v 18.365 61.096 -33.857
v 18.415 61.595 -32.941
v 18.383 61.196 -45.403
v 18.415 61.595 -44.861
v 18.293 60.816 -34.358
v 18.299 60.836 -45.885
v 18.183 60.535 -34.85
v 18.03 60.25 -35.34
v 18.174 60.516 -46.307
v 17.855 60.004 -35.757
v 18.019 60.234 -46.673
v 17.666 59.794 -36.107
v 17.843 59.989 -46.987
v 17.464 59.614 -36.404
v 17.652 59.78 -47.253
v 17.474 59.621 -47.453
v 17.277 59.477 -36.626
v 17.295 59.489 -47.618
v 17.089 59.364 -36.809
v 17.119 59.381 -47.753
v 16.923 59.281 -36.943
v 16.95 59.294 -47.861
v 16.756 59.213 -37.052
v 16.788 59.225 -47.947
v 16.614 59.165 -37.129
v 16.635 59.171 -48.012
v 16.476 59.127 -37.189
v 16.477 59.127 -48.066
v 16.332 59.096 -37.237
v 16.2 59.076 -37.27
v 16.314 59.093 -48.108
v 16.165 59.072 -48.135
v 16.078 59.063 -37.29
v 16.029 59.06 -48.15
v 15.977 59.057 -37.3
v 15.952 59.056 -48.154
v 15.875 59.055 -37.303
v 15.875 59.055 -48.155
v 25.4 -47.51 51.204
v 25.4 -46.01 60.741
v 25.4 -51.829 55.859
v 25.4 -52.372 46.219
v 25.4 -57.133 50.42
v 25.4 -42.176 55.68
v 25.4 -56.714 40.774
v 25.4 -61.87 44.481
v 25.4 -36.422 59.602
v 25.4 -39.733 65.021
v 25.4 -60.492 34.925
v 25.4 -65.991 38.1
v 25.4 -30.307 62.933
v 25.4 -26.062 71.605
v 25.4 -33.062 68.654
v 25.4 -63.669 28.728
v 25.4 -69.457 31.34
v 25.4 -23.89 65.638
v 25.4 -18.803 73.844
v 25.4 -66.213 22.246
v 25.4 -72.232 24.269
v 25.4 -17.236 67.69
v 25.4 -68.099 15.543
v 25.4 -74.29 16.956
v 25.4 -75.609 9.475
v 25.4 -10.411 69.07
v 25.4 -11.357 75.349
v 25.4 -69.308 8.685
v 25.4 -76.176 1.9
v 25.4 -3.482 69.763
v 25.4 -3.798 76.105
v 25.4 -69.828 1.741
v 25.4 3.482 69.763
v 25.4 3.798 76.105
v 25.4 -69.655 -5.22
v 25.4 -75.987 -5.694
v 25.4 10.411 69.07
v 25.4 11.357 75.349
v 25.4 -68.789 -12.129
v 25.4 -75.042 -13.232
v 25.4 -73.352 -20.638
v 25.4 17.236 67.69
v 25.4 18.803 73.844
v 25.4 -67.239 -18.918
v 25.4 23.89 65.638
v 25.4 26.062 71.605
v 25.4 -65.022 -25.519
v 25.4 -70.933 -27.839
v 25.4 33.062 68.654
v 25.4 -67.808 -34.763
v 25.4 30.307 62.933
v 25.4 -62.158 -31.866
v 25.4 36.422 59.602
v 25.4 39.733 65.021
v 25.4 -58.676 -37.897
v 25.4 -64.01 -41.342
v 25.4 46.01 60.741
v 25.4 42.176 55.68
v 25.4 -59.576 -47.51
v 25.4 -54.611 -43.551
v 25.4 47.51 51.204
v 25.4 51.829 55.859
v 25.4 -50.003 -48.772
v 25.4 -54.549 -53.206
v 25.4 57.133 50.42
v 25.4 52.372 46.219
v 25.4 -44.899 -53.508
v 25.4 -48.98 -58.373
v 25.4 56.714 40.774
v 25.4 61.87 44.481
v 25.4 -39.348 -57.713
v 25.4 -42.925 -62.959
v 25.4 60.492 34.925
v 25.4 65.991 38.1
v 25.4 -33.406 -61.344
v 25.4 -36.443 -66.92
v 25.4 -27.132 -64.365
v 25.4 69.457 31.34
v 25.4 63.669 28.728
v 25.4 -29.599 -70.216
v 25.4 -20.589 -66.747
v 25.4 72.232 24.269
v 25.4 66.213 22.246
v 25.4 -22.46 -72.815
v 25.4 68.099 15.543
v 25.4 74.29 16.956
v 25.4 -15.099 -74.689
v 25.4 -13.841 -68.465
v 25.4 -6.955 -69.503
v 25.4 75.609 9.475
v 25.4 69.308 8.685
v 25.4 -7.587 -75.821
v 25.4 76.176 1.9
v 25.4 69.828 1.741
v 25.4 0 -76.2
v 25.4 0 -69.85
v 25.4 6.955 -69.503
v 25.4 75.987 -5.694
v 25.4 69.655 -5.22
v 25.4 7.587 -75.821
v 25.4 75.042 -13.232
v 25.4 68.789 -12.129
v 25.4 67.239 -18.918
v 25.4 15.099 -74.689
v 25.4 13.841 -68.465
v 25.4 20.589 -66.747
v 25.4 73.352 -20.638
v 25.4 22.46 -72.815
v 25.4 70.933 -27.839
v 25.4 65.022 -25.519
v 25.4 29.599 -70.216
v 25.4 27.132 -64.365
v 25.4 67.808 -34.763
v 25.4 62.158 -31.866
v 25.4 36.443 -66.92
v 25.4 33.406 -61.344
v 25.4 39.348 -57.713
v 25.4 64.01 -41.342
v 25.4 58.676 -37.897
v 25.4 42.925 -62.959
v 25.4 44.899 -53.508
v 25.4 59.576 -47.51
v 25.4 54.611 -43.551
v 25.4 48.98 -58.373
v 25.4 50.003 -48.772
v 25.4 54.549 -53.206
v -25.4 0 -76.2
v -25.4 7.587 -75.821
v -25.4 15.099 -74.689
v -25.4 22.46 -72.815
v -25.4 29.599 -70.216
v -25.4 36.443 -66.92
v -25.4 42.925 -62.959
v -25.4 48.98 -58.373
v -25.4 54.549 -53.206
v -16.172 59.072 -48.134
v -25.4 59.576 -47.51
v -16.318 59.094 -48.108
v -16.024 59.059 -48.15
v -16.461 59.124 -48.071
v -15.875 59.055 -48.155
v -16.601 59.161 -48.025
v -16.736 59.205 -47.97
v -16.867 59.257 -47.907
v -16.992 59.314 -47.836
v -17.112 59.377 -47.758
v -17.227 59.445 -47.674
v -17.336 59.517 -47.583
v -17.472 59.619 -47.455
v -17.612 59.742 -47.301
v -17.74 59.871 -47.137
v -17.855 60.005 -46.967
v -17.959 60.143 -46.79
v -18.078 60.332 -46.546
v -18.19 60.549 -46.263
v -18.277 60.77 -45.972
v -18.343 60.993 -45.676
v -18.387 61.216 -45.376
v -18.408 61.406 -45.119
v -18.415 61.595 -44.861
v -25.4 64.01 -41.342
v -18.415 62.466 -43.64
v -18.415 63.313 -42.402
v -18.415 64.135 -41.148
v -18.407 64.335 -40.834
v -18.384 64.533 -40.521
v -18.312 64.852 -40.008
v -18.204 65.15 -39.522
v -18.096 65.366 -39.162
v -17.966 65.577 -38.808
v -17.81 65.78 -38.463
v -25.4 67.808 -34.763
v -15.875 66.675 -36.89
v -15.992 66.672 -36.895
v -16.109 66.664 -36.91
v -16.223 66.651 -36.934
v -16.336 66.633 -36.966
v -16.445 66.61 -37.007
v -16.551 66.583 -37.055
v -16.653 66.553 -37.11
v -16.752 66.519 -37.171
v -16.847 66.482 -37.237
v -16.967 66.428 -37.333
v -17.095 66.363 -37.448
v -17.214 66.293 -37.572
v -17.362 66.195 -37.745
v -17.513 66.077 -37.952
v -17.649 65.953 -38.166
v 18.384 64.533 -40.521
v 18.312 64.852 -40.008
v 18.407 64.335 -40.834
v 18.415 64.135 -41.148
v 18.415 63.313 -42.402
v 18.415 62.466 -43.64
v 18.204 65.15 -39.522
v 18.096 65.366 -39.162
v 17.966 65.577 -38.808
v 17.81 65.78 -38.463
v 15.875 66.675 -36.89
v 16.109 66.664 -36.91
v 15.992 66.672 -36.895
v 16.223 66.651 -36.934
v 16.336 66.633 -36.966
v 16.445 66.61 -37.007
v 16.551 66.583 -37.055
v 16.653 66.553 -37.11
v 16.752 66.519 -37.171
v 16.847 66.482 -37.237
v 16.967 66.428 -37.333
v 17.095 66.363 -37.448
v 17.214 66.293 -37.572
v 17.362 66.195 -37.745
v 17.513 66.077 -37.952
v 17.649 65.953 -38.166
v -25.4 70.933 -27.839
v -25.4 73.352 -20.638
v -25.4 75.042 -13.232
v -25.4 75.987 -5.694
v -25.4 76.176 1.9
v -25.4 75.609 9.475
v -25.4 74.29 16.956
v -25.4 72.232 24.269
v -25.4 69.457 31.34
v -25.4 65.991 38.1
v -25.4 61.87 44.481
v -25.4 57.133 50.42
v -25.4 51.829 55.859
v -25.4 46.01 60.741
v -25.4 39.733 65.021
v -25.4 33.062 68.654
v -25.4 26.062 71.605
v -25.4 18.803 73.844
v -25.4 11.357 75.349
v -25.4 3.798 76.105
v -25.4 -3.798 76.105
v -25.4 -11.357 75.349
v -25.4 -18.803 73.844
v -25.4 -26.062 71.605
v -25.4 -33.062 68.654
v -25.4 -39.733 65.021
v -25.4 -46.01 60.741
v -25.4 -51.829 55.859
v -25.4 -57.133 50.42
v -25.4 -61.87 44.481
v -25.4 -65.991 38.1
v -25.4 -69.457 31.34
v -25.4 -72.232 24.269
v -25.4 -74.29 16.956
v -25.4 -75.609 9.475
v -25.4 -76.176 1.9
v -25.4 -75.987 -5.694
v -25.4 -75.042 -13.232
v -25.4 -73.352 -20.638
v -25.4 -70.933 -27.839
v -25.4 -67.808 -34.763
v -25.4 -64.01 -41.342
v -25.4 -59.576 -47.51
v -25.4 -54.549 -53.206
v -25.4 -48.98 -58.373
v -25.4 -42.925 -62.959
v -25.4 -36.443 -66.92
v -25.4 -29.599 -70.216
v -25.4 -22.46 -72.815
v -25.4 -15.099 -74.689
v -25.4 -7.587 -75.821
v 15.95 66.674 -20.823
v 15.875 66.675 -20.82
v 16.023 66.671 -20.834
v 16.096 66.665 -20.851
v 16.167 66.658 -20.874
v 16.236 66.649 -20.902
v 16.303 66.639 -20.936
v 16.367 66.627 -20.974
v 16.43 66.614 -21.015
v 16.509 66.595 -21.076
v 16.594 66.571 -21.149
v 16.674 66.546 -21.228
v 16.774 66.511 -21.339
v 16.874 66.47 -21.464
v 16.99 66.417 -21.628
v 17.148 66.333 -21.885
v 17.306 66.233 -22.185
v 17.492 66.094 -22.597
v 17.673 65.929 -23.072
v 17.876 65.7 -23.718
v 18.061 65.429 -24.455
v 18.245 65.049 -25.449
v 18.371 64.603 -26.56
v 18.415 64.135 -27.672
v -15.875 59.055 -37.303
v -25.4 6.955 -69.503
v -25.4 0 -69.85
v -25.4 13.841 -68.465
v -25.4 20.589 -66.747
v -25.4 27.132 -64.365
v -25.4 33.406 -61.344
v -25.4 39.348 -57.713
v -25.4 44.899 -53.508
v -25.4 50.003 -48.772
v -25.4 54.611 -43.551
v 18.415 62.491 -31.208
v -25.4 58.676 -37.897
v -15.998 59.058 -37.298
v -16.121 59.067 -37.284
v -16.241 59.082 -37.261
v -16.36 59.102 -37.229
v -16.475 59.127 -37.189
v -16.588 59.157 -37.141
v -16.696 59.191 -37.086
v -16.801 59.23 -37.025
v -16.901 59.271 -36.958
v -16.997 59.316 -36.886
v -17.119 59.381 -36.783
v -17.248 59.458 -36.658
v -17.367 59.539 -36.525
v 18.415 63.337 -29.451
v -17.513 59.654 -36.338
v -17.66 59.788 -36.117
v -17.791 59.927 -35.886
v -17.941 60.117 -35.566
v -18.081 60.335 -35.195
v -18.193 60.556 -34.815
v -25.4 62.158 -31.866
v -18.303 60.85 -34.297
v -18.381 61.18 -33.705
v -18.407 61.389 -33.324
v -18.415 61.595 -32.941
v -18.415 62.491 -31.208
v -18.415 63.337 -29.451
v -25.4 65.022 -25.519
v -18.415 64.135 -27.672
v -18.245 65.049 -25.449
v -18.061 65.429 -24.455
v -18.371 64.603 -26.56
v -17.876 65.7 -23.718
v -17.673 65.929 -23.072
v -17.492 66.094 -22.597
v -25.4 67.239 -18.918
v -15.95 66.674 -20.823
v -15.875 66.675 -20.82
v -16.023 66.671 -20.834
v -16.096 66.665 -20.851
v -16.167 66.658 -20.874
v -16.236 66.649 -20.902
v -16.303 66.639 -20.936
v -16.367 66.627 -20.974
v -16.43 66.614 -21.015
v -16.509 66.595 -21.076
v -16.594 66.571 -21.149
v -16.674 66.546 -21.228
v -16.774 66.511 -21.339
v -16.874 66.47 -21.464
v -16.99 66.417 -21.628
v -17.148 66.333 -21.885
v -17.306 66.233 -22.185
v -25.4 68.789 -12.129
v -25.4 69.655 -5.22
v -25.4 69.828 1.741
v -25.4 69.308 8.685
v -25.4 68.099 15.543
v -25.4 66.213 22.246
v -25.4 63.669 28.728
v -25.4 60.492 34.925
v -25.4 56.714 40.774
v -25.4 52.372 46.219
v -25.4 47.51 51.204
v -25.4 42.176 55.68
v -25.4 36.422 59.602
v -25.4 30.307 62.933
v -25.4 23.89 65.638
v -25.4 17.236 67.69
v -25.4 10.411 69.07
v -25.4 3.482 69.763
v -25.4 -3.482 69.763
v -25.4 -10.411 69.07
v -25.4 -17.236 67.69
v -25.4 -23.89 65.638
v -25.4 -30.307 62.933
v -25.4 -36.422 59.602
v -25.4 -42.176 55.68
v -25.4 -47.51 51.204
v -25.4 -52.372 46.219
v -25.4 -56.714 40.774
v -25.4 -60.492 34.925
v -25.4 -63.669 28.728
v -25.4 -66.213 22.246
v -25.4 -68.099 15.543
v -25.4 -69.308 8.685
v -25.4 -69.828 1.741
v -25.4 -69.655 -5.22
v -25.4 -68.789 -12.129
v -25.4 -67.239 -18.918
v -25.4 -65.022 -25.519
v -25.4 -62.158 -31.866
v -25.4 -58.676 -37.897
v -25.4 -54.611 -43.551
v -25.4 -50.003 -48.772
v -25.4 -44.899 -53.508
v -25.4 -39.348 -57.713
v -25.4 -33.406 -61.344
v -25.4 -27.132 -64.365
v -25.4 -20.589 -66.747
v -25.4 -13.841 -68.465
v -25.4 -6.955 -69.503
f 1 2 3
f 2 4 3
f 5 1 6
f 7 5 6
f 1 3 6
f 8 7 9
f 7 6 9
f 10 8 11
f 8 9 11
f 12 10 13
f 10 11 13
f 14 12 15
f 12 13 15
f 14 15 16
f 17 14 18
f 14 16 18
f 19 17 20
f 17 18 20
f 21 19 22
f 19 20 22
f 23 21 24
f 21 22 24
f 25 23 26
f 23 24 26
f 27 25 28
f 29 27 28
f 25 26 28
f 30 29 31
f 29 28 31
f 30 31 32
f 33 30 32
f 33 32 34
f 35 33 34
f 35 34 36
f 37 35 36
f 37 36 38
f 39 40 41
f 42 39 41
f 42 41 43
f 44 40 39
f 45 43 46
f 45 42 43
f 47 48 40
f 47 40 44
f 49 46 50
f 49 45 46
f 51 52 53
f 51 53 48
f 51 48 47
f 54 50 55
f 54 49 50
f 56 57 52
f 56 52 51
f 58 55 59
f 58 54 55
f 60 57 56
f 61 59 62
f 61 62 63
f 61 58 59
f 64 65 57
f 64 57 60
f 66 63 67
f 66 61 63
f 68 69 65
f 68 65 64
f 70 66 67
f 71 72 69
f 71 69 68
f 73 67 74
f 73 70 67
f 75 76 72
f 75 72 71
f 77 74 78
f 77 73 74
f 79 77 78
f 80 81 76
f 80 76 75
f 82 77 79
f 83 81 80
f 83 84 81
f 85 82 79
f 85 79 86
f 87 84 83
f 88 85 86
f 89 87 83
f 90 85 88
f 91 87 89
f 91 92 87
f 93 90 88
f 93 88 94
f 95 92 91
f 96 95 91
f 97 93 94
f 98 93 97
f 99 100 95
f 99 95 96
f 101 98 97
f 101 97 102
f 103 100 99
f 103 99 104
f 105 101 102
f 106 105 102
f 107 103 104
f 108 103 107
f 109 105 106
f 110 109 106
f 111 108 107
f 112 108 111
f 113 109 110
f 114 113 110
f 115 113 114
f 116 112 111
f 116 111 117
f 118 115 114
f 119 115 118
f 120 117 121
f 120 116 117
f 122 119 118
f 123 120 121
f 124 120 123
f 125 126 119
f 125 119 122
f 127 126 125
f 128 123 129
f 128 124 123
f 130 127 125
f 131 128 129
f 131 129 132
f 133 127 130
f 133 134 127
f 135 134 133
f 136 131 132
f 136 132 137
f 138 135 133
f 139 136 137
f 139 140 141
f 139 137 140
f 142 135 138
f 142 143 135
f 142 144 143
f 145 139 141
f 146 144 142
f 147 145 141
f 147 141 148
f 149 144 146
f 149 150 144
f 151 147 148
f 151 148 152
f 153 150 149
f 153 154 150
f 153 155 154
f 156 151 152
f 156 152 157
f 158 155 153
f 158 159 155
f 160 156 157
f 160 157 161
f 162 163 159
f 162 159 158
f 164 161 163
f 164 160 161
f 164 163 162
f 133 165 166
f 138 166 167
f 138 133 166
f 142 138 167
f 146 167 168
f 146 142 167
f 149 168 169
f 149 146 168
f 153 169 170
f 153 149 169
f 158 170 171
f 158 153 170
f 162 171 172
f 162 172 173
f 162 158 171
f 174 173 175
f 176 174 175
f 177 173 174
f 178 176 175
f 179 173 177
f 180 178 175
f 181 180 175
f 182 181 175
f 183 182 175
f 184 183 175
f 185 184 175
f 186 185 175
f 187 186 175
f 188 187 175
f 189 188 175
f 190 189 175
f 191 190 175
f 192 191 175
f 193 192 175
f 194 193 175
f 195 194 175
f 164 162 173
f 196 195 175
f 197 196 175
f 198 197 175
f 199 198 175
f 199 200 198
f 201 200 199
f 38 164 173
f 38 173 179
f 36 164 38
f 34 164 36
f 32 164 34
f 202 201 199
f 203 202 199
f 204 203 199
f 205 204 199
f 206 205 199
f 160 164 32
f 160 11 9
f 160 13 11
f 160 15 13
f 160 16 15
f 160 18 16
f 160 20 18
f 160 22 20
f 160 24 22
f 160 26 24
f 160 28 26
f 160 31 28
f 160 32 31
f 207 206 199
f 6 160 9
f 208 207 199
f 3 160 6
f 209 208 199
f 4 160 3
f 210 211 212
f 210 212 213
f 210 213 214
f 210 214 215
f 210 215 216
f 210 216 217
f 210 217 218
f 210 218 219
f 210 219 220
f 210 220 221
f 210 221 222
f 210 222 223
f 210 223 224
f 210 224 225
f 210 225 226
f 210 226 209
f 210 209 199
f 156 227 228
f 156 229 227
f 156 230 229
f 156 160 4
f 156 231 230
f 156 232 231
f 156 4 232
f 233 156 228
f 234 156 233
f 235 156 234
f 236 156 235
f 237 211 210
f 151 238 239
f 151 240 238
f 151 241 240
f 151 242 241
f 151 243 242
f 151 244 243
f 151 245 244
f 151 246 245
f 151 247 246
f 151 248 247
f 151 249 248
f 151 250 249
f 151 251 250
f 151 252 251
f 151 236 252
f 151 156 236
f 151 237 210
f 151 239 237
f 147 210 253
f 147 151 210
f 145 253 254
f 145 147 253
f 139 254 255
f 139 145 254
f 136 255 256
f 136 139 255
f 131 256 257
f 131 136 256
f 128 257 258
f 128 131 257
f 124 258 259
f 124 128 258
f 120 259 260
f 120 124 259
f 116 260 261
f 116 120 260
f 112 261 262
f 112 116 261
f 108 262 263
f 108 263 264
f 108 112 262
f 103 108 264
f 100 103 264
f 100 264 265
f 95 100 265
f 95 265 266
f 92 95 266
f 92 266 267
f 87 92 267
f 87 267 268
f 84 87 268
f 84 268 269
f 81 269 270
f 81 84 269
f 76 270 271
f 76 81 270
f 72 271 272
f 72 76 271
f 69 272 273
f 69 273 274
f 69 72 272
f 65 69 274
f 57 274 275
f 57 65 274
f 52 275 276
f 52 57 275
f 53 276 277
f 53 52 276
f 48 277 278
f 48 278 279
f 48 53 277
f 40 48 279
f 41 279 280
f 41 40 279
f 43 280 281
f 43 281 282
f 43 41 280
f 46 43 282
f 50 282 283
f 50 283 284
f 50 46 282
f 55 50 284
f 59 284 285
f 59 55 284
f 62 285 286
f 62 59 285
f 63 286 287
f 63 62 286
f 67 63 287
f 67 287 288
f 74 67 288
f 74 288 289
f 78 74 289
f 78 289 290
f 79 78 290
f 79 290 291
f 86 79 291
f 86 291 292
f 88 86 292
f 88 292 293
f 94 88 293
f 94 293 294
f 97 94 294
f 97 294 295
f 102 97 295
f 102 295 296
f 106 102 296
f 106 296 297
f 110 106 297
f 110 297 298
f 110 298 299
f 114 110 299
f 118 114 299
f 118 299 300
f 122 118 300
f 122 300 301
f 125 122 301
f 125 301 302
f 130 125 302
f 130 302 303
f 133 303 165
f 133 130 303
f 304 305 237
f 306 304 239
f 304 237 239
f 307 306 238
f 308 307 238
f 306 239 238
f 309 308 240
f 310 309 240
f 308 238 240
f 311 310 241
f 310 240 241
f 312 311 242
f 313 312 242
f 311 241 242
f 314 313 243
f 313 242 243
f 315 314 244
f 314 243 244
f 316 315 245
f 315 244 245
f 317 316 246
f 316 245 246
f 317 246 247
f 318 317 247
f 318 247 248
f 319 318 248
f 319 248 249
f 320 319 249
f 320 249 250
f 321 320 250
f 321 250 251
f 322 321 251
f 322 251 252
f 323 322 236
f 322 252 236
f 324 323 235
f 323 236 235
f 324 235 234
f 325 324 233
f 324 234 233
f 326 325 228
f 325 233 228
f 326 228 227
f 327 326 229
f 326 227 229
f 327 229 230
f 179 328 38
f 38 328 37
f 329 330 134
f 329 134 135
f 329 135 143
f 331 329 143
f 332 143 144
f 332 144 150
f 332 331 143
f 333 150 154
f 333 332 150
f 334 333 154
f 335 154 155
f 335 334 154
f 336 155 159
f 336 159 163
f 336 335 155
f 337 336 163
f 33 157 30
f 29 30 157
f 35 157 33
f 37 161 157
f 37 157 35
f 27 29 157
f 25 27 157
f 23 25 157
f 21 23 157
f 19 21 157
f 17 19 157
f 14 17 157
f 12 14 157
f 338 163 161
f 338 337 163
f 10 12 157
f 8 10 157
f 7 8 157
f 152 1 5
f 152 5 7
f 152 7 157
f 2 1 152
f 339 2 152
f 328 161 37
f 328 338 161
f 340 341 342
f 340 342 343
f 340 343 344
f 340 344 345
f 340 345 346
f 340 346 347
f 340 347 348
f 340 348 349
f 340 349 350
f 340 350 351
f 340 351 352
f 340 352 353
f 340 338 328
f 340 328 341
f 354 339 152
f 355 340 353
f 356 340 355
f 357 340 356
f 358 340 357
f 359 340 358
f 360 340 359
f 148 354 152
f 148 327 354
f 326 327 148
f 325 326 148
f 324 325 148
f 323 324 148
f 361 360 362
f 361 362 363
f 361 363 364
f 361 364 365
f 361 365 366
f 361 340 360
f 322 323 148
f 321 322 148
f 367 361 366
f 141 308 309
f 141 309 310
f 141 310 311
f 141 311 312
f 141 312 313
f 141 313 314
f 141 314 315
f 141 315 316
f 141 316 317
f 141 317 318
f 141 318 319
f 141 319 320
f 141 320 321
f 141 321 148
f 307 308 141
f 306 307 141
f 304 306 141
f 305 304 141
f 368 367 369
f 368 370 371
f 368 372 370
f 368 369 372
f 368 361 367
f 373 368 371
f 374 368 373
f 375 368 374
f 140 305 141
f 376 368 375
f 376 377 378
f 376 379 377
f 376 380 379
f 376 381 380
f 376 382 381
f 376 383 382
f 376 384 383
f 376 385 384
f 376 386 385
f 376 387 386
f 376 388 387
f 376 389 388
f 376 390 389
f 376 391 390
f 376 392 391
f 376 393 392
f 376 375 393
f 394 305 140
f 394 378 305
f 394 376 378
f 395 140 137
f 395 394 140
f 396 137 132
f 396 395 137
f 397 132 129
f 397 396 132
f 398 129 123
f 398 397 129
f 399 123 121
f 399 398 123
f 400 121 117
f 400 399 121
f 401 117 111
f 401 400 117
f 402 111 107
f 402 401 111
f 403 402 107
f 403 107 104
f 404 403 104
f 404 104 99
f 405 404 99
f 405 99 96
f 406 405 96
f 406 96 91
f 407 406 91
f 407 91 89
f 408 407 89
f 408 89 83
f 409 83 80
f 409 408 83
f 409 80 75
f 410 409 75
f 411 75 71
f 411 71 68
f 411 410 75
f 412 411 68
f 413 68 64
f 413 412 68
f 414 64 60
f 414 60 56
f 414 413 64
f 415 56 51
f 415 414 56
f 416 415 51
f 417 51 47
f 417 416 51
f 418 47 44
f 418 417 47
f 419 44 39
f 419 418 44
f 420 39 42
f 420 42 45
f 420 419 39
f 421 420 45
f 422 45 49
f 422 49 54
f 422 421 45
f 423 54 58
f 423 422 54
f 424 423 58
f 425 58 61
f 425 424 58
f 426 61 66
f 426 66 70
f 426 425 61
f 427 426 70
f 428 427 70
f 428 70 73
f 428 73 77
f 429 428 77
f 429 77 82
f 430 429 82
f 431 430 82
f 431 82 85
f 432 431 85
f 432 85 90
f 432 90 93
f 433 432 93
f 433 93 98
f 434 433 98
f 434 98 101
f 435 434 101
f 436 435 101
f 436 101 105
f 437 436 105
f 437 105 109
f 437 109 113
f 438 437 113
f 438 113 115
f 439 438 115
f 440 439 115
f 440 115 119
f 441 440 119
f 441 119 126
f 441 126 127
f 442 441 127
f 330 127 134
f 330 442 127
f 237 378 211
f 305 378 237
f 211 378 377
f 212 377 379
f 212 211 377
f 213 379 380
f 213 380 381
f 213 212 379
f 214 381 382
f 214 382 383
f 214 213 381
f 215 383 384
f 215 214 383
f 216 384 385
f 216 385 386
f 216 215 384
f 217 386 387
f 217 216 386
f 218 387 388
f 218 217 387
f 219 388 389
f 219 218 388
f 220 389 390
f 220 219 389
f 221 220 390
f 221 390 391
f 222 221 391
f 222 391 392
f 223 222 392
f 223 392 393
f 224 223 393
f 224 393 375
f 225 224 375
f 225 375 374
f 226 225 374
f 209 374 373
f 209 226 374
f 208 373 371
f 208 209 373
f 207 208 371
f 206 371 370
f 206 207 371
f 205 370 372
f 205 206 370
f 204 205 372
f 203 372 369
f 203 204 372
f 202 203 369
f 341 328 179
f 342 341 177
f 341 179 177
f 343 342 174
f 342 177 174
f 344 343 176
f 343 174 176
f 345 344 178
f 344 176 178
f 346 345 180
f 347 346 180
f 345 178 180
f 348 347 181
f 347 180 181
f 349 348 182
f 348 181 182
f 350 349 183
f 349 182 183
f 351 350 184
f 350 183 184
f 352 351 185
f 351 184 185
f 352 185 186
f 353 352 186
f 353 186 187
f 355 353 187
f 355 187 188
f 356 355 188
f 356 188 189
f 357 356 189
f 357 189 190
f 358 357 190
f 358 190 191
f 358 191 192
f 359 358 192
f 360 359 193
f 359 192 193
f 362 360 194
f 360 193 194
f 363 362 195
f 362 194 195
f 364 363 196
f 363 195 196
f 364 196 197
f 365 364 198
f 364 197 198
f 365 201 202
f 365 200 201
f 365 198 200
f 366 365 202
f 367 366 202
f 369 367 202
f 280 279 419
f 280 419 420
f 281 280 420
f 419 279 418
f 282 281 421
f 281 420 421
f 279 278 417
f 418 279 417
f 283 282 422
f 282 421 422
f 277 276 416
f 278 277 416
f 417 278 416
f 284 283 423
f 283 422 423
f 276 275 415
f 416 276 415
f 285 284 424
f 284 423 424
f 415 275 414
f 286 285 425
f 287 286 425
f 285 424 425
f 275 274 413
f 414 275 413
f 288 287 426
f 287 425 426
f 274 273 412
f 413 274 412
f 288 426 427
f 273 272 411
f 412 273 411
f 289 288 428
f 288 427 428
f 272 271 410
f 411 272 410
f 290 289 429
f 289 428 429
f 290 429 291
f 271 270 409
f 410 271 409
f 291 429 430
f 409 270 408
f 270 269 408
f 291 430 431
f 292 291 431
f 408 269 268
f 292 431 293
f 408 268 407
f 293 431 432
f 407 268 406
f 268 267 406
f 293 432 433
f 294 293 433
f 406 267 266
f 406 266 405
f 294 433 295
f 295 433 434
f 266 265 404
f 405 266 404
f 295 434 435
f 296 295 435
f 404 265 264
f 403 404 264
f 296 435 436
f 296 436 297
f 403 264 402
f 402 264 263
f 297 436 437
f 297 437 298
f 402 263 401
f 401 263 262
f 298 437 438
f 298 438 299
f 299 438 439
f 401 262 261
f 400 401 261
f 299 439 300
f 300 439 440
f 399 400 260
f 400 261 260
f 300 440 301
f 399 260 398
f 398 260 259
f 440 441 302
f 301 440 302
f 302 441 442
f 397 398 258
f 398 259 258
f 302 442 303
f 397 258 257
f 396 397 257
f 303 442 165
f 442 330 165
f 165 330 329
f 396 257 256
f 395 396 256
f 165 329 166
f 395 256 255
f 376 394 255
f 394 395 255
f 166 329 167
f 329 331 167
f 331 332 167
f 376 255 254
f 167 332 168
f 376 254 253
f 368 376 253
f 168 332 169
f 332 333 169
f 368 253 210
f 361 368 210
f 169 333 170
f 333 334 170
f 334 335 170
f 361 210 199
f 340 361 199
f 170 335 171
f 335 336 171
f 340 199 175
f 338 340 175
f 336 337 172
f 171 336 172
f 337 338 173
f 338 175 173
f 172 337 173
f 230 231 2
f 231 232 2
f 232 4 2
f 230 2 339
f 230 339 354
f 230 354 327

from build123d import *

# Parameters (mm, degrees)
SKETCH1_R               = 76.2
SKETCH1_R_2             = 69.85
BOSS_EXTRUDE1_DEPTH     = 25.4
CUT_EXTRUDE1_REACH      = 112.716
CUT_EXTRUDE1_END_RADIUS = 76.2
SKETCH4_W               = 36.83
SKETCH4_H               = 7.62
FILLET1_R               = 2.54


with BuildPart() as part:
    # Sketch1 → Boss-Extrude1 (new, symmetric)
    with BuildSketch(Plane(origin=(0, 0, 0), x_dir=(0, 0, -1), z_dir=(1, 0, 0))):
        Circle(SKETCH1_R)
        Circle(SKETCH1_R_2, mode=Mode.SUBTRACT)
    extrude(amount=BOSS_EXTRUDE1_DEPTH, both=True)

    # Cut-Extrude1: up to this cylinder (the profile starts inside it)
    cut_extrude1_end = Plane(origin=(0, 0, 0), z_dir=(-1, 0, 0)) * Cylinder(CUT_EXTRUDE1_END_RADIUS, 378.832, mode=Mode.PRIVATE)
    # Sketch4 → Cut-Extrude1 (cut, up to the surface)
    with BuildSketch(Plane.XY, mode=Mode.PRIVATE) as cut_extrude1_sk1:
        with Locations((0, 62.865)):
            Rectangle(SKETCH4_W, SKETCH4_H)
    cut_extrude1_tool1 = extrude(cut_extrude1_sk1.sketch, amount=-CUT_EXTRUDE1_REACH, mode=Mode.PRIVATE) & cut_extrude1_end
    add(cut_extrude1_tool1.solids().sort_by_distance((0, 62.865, 0))[0], mode=Mode.SUBTRACT)

    # Fillet1
    fillet1_edges = [part.edges().sort_by_distance(p)[0] for p in [
        (-18.415, 59.055, -42.729327968),
        (-18.415, 66.675, -28.855016844),
        (18.415, 66.675, -28.855016844),
        (18.415, 59.055, -42.729327968),
    ]]
    fillet(fillet1_edges, radius=FILLET1_R)


solid = part.part
